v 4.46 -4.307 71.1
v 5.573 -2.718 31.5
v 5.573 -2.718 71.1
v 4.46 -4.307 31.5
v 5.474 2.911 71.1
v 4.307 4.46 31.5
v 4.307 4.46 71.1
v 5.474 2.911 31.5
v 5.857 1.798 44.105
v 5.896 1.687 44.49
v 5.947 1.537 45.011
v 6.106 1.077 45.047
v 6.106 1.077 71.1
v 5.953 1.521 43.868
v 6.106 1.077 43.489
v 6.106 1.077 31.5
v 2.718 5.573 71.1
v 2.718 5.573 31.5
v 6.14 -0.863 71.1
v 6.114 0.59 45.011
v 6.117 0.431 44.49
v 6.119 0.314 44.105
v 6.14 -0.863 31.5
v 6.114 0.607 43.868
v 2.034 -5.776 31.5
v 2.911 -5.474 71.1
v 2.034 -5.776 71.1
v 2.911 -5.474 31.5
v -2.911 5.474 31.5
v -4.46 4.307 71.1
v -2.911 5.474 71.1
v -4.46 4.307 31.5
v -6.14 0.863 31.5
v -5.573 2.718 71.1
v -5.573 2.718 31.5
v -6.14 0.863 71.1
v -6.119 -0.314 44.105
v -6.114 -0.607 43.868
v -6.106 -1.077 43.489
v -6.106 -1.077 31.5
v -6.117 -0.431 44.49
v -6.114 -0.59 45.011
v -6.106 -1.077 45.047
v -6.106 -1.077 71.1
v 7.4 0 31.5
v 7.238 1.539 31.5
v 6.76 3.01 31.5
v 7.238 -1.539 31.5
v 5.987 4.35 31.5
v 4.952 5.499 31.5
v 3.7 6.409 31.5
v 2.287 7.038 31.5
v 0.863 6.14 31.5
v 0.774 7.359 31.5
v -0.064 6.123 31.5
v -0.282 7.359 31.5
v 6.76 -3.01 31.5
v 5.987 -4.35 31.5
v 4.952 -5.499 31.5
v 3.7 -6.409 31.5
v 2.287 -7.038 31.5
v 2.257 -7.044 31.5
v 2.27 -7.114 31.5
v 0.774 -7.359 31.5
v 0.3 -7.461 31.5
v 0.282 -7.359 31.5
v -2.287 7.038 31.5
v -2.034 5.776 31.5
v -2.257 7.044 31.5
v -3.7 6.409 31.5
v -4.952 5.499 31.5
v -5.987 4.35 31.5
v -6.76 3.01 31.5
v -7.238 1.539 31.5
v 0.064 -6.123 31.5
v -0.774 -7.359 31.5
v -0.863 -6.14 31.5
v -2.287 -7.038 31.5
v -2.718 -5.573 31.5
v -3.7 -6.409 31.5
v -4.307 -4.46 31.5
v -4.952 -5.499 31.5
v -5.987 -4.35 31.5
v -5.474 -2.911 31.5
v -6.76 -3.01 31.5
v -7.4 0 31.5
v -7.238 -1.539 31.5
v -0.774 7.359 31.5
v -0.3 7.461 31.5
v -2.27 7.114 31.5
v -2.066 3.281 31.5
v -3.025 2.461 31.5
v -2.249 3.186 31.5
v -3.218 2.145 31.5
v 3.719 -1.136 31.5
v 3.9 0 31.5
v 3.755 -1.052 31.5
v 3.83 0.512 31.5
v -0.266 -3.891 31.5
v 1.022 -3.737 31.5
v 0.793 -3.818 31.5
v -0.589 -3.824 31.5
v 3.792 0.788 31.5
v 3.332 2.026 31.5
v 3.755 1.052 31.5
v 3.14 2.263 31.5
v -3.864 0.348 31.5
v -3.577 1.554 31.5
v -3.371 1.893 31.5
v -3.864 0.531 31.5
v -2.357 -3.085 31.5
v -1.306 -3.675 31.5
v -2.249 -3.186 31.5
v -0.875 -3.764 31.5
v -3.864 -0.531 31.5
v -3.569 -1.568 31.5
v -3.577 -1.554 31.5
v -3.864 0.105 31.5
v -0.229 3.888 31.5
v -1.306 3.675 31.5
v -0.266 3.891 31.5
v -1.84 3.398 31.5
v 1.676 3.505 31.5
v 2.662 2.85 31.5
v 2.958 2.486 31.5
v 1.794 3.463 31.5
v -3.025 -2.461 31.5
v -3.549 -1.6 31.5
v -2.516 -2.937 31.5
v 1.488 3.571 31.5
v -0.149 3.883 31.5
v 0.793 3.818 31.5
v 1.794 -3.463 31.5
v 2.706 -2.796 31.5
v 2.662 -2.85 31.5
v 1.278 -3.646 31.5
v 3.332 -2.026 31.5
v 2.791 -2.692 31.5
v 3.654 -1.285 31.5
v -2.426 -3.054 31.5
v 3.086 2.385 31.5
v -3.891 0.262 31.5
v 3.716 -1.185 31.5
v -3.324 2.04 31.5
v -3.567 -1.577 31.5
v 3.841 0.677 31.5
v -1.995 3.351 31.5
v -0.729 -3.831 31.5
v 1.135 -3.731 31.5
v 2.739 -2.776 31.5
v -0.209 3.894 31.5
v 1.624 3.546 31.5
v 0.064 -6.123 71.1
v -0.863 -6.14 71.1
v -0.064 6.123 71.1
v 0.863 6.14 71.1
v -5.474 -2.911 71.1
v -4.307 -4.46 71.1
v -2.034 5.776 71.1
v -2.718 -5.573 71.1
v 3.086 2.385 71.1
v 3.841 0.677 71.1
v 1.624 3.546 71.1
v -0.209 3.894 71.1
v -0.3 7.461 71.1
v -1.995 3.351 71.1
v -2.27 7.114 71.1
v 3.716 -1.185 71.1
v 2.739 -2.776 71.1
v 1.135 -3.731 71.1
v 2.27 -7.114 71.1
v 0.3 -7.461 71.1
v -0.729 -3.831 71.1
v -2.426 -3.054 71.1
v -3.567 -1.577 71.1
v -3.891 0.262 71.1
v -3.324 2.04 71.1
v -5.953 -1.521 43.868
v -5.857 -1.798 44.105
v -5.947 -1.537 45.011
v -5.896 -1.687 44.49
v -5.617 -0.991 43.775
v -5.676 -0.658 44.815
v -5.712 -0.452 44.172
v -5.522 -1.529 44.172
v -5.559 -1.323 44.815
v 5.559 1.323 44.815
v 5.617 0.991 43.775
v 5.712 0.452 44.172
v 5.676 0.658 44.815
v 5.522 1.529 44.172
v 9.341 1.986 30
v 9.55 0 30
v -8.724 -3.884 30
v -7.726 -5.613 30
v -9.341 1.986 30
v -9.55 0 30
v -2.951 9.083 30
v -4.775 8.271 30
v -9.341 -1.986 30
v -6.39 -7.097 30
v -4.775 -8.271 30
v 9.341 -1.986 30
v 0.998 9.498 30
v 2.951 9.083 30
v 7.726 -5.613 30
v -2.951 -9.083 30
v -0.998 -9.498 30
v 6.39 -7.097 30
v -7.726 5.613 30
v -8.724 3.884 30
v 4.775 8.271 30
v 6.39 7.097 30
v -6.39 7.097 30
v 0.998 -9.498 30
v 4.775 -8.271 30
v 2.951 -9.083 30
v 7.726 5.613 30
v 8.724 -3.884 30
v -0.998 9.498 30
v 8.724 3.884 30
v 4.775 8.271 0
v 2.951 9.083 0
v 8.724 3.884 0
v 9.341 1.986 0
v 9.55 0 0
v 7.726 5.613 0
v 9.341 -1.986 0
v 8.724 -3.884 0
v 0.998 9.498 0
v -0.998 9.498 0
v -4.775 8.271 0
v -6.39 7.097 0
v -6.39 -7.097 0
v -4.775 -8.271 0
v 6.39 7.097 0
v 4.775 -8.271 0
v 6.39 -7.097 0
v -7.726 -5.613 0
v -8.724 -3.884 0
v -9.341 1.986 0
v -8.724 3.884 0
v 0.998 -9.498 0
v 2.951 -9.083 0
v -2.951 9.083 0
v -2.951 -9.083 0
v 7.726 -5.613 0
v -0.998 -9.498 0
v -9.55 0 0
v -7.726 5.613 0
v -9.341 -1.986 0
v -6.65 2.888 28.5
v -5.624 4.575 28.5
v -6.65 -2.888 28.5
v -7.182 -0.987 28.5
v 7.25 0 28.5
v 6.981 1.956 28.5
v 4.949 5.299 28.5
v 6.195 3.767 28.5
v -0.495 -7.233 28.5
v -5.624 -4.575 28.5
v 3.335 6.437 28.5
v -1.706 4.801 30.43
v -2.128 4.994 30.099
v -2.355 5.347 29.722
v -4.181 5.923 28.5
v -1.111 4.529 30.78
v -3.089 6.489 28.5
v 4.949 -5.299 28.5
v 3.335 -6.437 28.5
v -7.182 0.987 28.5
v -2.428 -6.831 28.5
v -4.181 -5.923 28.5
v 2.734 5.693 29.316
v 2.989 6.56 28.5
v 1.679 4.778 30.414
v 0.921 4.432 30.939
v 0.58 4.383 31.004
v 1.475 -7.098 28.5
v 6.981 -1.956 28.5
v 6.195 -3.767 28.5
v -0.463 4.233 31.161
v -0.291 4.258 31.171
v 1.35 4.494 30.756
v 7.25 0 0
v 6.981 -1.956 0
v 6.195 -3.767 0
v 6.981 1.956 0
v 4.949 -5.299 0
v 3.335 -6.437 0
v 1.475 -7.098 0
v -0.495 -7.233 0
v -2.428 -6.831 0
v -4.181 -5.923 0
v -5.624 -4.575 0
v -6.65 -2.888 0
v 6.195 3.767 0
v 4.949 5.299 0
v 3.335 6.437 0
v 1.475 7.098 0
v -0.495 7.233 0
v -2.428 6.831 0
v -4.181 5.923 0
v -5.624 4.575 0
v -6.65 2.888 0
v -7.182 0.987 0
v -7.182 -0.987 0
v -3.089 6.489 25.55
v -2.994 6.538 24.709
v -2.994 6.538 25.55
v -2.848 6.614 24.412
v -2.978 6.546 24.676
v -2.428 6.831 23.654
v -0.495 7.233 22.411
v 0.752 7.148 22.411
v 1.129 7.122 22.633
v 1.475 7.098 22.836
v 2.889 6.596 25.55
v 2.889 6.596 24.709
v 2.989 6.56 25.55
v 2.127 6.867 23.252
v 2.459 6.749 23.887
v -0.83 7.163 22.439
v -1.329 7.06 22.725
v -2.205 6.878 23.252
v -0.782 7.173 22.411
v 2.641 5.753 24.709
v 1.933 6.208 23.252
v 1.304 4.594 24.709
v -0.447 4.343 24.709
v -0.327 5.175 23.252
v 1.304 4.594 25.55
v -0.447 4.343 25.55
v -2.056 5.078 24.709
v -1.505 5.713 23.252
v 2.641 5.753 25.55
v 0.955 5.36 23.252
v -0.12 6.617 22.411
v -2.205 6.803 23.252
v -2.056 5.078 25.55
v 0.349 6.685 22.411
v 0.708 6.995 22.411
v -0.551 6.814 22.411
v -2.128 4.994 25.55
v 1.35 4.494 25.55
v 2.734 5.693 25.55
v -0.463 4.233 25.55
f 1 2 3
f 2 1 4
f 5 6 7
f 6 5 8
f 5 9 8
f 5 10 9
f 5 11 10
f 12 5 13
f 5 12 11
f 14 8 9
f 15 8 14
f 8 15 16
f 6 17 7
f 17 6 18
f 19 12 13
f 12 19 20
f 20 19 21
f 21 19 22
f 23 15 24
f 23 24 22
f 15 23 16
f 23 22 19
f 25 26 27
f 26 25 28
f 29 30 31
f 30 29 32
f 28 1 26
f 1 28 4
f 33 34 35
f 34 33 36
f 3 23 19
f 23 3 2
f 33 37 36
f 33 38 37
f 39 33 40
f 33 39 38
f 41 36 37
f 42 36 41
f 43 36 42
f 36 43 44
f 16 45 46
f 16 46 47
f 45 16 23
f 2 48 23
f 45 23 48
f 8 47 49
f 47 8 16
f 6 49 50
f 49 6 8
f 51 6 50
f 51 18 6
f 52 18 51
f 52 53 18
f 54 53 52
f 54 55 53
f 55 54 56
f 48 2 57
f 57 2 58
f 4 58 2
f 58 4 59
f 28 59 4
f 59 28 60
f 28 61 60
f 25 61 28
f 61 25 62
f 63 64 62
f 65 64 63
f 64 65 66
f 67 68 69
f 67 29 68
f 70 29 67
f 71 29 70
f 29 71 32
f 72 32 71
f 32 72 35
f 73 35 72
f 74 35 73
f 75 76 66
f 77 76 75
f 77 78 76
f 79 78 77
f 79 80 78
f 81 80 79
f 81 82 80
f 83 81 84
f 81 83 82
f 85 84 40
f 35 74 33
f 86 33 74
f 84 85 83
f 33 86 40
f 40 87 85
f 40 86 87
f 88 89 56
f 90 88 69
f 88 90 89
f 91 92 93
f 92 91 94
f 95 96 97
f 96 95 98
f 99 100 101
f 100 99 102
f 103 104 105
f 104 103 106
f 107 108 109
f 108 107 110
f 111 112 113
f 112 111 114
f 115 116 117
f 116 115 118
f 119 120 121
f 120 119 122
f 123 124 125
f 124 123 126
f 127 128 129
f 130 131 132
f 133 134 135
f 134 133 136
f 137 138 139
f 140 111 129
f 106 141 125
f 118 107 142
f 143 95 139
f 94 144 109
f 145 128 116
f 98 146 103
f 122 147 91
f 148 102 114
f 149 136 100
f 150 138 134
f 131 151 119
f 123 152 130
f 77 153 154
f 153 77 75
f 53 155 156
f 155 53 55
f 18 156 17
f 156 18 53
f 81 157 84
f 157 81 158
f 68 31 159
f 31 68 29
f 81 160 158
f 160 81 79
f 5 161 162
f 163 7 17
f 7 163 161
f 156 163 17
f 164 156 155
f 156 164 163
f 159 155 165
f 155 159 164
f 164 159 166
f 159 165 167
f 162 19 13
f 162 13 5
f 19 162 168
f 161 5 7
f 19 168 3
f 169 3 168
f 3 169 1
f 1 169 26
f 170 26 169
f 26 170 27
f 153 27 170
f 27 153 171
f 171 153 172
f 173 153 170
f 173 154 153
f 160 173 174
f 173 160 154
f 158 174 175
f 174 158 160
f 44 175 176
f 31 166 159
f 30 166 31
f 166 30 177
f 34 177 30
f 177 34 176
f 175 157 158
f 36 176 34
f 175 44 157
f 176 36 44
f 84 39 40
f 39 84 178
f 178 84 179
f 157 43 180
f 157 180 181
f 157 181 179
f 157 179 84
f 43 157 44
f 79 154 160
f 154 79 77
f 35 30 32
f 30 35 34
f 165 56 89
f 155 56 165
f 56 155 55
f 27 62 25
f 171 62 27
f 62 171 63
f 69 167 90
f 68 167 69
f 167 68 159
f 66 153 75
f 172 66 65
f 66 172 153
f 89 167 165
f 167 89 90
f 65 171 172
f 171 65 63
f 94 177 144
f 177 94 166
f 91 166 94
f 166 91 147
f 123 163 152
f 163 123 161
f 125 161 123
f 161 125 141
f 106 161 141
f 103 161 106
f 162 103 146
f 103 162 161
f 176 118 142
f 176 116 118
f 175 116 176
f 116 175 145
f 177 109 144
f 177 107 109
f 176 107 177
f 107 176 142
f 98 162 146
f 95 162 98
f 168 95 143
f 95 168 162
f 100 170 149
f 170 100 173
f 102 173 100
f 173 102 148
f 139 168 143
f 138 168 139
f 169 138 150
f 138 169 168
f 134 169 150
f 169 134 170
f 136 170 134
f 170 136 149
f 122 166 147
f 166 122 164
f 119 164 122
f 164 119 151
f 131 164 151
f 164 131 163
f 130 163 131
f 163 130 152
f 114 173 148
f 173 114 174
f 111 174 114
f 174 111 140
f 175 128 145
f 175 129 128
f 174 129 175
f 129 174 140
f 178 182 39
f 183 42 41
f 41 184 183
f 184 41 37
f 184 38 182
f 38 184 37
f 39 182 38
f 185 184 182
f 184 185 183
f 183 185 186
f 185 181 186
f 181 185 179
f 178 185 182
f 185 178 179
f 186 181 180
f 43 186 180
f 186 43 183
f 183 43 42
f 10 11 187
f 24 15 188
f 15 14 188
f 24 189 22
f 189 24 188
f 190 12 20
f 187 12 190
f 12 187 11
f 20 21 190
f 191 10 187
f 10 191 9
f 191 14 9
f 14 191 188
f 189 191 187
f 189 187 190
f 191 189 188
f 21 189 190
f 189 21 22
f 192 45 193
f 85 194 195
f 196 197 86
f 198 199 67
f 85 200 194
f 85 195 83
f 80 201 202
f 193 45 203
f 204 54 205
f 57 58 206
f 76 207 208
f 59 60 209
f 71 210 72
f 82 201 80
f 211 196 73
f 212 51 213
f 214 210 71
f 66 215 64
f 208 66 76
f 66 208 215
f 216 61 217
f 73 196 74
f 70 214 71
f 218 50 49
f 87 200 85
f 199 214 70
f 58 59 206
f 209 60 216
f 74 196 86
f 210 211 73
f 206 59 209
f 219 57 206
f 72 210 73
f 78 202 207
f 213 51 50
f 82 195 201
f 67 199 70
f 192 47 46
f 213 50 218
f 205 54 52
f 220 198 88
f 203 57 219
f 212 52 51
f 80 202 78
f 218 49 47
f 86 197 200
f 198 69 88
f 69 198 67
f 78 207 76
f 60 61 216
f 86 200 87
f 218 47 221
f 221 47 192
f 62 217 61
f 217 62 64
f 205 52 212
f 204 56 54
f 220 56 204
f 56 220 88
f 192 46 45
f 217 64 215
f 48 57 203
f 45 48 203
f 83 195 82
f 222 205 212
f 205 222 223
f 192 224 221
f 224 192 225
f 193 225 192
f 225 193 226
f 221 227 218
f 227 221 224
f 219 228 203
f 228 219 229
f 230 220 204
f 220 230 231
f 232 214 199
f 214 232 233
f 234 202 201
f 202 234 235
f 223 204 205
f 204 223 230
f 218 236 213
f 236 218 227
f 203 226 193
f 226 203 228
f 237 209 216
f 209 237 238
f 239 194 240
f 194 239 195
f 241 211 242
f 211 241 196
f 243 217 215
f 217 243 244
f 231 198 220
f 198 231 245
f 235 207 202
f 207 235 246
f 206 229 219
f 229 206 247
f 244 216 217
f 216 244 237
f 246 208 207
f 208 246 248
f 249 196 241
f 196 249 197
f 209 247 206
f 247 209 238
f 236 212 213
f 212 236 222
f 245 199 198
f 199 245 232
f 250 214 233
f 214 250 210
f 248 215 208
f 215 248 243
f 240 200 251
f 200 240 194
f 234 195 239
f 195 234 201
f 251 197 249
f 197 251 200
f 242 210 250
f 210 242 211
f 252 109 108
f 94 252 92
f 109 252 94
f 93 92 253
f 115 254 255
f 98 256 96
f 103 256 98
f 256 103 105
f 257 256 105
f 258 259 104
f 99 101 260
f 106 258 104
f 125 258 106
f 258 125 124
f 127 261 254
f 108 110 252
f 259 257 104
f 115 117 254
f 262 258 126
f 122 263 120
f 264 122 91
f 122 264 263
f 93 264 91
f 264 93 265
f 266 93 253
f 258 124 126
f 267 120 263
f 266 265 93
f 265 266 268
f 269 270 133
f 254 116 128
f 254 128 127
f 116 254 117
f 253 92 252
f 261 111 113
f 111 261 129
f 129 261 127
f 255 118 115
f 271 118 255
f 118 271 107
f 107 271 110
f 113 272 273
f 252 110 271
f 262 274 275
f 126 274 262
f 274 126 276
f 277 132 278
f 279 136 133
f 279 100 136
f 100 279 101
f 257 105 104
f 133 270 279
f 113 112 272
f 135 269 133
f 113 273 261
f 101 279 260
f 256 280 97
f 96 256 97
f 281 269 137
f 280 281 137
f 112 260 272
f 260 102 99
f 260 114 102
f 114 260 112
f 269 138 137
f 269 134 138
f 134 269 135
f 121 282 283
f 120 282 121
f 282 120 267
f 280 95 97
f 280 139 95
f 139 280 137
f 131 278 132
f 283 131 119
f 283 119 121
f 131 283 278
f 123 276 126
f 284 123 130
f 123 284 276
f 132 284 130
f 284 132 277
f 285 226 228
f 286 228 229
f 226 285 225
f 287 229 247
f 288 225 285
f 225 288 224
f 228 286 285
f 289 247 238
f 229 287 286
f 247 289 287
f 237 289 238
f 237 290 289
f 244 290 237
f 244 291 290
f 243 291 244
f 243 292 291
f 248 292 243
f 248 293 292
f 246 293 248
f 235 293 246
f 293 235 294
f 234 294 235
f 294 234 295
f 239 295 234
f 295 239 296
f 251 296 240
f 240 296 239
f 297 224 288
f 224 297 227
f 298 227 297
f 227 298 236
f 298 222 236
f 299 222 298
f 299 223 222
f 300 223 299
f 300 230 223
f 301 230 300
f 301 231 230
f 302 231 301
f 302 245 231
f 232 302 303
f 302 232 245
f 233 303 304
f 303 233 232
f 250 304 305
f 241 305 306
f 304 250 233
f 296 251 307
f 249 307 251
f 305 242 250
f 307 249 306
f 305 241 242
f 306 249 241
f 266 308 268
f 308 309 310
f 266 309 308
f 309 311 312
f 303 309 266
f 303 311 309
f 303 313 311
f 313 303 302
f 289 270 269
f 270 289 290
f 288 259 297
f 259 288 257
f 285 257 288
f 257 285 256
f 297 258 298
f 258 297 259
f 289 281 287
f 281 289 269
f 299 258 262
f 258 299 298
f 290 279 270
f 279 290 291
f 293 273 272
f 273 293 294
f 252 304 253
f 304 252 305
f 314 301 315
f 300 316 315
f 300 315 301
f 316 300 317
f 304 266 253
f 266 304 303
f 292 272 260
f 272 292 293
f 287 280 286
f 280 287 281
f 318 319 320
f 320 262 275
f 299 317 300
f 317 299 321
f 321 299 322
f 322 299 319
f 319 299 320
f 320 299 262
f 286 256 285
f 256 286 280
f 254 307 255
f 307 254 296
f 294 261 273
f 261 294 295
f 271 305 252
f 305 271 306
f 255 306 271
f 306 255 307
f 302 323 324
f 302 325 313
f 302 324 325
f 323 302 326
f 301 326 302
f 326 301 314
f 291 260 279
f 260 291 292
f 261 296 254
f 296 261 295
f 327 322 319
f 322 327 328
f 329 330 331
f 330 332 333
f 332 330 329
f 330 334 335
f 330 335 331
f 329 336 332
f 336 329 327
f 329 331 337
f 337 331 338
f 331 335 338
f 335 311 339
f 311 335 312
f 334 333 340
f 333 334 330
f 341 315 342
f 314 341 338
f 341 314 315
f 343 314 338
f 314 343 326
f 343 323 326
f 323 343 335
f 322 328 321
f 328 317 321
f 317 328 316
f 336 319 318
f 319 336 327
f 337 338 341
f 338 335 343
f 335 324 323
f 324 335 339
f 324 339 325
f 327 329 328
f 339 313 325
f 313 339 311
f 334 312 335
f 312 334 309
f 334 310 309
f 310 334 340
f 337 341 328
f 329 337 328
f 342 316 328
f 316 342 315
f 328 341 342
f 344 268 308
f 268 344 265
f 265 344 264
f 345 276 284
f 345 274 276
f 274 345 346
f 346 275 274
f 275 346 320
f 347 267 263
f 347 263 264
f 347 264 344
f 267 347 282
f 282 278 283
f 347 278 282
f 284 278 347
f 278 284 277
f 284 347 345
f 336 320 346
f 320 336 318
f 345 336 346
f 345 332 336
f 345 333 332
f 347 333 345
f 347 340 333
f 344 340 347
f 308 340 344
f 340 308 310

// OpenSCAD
// sidewinder vyska (spodni)
sidewinder_height = 28.5; // 29.2mm
//sidewinder_height = 10;
// vyska mezikusu
inter_height = 3;

// sirka steny
wall = 2.3; // 2.3mm (CH FS)
fs_wall = 2.3;
sd_wall = wall;

// sidewinder
sidewinder_diameter = 14.5; // 13.9mm
cube_width = 6; // 5.6mm

// fighterstick
fighterstick_diameter = 12.4; // 12.6mm
fighterstick_height = 39.6; // 39.6mm
fighterstick_rotation = 10;
stable_length = 14.8; // 15mm
stable_width = 2.0; // 2.3mm
//fighterstick_height = 4; // 39.6mm

// inter
idr = (sidewinder_diameter + 2 * wall) / 2;
iur = stable_length / 2;

adapter(sidewinder_height,inter_height,fighterstick_height);

module adapter(s,z,f) {
    rotate([0,0,fighterstick_rotation]) { translate([0,0,s+z]) { fighterstick(f,8); } }
    translate([0,0,s]) { interpart(z,idr,iur); }
    sidewinder(s);
}

module interpart(height,d,u) {
    holer = fighterstick_diameter - 2 * fs_wall;
    difference() {
        union() {
            translate([0,0,height*0.5]) { cylinder(height*0.5,d,u); }
            cylinder(height*0.5,r=d);
        }
        cylinder(height,sidewinder_diameter/2,holer/2);
    }
}

module sidewinder(height) {
  diameter = sidewinder_diameter;
  outer_diameter = diameter + 2 * wall;
  cubew = cube_width;
  union() {
    difference() {
      cylinder(height,d=outer_diameter);
      cylinder(height,diameter/2,(diameter/2));
    }
    intersection() {
      translate([0,cubew,height+inter_height-((cubew+inter_height)/2)]) { 
        translate([0,1.45,-1.45]) {
          union() {
            sphere(d=cubew+0.5,true);
            cylinder(cubew+0.5,d=cubew+0.5,true);
          }
        }
      }
      union() {
        cylinder(height+inter_height,d=fighterstick_diameter-2*wall);
        translate([0,0,sidewinder_height+inter_height/2]) {
          cylinder(inter_height/2,idr,iur);
        }
        cylinder(sidewinder_height+inter_height/2,d=sidewinder_diameter+2*wall);      
      }
    }
  }
}

module fighterstick(height) {
    diameter = fighterstick_diameter;
    stablel = stable_length;
    stablew = stable_width;
    wall = fs_wall;
    hole_diameter = 2.3; // 2.3mm (depth = 2.2mm)
    hole_height = 12.85; // 11.7mm
    difference() {
        union() {
            cylinder(height,d=diameter);
            translate([0,0,height/2]) { cube([stablew,stablel,height],true); }
        }
        cylinder(height,d=diameter-2*wall);
        translate([-diameter/2-0.5,0,hole_height]) {
            rotate([0,90,0]) { sphere(d=hole_diameter, true); }
        }
        translate([diameter/2+0.5,0,hole_height]) {
            rotate([0,90,0]) { sphere(d=hole_diameter, true); }
        }

   }
}
